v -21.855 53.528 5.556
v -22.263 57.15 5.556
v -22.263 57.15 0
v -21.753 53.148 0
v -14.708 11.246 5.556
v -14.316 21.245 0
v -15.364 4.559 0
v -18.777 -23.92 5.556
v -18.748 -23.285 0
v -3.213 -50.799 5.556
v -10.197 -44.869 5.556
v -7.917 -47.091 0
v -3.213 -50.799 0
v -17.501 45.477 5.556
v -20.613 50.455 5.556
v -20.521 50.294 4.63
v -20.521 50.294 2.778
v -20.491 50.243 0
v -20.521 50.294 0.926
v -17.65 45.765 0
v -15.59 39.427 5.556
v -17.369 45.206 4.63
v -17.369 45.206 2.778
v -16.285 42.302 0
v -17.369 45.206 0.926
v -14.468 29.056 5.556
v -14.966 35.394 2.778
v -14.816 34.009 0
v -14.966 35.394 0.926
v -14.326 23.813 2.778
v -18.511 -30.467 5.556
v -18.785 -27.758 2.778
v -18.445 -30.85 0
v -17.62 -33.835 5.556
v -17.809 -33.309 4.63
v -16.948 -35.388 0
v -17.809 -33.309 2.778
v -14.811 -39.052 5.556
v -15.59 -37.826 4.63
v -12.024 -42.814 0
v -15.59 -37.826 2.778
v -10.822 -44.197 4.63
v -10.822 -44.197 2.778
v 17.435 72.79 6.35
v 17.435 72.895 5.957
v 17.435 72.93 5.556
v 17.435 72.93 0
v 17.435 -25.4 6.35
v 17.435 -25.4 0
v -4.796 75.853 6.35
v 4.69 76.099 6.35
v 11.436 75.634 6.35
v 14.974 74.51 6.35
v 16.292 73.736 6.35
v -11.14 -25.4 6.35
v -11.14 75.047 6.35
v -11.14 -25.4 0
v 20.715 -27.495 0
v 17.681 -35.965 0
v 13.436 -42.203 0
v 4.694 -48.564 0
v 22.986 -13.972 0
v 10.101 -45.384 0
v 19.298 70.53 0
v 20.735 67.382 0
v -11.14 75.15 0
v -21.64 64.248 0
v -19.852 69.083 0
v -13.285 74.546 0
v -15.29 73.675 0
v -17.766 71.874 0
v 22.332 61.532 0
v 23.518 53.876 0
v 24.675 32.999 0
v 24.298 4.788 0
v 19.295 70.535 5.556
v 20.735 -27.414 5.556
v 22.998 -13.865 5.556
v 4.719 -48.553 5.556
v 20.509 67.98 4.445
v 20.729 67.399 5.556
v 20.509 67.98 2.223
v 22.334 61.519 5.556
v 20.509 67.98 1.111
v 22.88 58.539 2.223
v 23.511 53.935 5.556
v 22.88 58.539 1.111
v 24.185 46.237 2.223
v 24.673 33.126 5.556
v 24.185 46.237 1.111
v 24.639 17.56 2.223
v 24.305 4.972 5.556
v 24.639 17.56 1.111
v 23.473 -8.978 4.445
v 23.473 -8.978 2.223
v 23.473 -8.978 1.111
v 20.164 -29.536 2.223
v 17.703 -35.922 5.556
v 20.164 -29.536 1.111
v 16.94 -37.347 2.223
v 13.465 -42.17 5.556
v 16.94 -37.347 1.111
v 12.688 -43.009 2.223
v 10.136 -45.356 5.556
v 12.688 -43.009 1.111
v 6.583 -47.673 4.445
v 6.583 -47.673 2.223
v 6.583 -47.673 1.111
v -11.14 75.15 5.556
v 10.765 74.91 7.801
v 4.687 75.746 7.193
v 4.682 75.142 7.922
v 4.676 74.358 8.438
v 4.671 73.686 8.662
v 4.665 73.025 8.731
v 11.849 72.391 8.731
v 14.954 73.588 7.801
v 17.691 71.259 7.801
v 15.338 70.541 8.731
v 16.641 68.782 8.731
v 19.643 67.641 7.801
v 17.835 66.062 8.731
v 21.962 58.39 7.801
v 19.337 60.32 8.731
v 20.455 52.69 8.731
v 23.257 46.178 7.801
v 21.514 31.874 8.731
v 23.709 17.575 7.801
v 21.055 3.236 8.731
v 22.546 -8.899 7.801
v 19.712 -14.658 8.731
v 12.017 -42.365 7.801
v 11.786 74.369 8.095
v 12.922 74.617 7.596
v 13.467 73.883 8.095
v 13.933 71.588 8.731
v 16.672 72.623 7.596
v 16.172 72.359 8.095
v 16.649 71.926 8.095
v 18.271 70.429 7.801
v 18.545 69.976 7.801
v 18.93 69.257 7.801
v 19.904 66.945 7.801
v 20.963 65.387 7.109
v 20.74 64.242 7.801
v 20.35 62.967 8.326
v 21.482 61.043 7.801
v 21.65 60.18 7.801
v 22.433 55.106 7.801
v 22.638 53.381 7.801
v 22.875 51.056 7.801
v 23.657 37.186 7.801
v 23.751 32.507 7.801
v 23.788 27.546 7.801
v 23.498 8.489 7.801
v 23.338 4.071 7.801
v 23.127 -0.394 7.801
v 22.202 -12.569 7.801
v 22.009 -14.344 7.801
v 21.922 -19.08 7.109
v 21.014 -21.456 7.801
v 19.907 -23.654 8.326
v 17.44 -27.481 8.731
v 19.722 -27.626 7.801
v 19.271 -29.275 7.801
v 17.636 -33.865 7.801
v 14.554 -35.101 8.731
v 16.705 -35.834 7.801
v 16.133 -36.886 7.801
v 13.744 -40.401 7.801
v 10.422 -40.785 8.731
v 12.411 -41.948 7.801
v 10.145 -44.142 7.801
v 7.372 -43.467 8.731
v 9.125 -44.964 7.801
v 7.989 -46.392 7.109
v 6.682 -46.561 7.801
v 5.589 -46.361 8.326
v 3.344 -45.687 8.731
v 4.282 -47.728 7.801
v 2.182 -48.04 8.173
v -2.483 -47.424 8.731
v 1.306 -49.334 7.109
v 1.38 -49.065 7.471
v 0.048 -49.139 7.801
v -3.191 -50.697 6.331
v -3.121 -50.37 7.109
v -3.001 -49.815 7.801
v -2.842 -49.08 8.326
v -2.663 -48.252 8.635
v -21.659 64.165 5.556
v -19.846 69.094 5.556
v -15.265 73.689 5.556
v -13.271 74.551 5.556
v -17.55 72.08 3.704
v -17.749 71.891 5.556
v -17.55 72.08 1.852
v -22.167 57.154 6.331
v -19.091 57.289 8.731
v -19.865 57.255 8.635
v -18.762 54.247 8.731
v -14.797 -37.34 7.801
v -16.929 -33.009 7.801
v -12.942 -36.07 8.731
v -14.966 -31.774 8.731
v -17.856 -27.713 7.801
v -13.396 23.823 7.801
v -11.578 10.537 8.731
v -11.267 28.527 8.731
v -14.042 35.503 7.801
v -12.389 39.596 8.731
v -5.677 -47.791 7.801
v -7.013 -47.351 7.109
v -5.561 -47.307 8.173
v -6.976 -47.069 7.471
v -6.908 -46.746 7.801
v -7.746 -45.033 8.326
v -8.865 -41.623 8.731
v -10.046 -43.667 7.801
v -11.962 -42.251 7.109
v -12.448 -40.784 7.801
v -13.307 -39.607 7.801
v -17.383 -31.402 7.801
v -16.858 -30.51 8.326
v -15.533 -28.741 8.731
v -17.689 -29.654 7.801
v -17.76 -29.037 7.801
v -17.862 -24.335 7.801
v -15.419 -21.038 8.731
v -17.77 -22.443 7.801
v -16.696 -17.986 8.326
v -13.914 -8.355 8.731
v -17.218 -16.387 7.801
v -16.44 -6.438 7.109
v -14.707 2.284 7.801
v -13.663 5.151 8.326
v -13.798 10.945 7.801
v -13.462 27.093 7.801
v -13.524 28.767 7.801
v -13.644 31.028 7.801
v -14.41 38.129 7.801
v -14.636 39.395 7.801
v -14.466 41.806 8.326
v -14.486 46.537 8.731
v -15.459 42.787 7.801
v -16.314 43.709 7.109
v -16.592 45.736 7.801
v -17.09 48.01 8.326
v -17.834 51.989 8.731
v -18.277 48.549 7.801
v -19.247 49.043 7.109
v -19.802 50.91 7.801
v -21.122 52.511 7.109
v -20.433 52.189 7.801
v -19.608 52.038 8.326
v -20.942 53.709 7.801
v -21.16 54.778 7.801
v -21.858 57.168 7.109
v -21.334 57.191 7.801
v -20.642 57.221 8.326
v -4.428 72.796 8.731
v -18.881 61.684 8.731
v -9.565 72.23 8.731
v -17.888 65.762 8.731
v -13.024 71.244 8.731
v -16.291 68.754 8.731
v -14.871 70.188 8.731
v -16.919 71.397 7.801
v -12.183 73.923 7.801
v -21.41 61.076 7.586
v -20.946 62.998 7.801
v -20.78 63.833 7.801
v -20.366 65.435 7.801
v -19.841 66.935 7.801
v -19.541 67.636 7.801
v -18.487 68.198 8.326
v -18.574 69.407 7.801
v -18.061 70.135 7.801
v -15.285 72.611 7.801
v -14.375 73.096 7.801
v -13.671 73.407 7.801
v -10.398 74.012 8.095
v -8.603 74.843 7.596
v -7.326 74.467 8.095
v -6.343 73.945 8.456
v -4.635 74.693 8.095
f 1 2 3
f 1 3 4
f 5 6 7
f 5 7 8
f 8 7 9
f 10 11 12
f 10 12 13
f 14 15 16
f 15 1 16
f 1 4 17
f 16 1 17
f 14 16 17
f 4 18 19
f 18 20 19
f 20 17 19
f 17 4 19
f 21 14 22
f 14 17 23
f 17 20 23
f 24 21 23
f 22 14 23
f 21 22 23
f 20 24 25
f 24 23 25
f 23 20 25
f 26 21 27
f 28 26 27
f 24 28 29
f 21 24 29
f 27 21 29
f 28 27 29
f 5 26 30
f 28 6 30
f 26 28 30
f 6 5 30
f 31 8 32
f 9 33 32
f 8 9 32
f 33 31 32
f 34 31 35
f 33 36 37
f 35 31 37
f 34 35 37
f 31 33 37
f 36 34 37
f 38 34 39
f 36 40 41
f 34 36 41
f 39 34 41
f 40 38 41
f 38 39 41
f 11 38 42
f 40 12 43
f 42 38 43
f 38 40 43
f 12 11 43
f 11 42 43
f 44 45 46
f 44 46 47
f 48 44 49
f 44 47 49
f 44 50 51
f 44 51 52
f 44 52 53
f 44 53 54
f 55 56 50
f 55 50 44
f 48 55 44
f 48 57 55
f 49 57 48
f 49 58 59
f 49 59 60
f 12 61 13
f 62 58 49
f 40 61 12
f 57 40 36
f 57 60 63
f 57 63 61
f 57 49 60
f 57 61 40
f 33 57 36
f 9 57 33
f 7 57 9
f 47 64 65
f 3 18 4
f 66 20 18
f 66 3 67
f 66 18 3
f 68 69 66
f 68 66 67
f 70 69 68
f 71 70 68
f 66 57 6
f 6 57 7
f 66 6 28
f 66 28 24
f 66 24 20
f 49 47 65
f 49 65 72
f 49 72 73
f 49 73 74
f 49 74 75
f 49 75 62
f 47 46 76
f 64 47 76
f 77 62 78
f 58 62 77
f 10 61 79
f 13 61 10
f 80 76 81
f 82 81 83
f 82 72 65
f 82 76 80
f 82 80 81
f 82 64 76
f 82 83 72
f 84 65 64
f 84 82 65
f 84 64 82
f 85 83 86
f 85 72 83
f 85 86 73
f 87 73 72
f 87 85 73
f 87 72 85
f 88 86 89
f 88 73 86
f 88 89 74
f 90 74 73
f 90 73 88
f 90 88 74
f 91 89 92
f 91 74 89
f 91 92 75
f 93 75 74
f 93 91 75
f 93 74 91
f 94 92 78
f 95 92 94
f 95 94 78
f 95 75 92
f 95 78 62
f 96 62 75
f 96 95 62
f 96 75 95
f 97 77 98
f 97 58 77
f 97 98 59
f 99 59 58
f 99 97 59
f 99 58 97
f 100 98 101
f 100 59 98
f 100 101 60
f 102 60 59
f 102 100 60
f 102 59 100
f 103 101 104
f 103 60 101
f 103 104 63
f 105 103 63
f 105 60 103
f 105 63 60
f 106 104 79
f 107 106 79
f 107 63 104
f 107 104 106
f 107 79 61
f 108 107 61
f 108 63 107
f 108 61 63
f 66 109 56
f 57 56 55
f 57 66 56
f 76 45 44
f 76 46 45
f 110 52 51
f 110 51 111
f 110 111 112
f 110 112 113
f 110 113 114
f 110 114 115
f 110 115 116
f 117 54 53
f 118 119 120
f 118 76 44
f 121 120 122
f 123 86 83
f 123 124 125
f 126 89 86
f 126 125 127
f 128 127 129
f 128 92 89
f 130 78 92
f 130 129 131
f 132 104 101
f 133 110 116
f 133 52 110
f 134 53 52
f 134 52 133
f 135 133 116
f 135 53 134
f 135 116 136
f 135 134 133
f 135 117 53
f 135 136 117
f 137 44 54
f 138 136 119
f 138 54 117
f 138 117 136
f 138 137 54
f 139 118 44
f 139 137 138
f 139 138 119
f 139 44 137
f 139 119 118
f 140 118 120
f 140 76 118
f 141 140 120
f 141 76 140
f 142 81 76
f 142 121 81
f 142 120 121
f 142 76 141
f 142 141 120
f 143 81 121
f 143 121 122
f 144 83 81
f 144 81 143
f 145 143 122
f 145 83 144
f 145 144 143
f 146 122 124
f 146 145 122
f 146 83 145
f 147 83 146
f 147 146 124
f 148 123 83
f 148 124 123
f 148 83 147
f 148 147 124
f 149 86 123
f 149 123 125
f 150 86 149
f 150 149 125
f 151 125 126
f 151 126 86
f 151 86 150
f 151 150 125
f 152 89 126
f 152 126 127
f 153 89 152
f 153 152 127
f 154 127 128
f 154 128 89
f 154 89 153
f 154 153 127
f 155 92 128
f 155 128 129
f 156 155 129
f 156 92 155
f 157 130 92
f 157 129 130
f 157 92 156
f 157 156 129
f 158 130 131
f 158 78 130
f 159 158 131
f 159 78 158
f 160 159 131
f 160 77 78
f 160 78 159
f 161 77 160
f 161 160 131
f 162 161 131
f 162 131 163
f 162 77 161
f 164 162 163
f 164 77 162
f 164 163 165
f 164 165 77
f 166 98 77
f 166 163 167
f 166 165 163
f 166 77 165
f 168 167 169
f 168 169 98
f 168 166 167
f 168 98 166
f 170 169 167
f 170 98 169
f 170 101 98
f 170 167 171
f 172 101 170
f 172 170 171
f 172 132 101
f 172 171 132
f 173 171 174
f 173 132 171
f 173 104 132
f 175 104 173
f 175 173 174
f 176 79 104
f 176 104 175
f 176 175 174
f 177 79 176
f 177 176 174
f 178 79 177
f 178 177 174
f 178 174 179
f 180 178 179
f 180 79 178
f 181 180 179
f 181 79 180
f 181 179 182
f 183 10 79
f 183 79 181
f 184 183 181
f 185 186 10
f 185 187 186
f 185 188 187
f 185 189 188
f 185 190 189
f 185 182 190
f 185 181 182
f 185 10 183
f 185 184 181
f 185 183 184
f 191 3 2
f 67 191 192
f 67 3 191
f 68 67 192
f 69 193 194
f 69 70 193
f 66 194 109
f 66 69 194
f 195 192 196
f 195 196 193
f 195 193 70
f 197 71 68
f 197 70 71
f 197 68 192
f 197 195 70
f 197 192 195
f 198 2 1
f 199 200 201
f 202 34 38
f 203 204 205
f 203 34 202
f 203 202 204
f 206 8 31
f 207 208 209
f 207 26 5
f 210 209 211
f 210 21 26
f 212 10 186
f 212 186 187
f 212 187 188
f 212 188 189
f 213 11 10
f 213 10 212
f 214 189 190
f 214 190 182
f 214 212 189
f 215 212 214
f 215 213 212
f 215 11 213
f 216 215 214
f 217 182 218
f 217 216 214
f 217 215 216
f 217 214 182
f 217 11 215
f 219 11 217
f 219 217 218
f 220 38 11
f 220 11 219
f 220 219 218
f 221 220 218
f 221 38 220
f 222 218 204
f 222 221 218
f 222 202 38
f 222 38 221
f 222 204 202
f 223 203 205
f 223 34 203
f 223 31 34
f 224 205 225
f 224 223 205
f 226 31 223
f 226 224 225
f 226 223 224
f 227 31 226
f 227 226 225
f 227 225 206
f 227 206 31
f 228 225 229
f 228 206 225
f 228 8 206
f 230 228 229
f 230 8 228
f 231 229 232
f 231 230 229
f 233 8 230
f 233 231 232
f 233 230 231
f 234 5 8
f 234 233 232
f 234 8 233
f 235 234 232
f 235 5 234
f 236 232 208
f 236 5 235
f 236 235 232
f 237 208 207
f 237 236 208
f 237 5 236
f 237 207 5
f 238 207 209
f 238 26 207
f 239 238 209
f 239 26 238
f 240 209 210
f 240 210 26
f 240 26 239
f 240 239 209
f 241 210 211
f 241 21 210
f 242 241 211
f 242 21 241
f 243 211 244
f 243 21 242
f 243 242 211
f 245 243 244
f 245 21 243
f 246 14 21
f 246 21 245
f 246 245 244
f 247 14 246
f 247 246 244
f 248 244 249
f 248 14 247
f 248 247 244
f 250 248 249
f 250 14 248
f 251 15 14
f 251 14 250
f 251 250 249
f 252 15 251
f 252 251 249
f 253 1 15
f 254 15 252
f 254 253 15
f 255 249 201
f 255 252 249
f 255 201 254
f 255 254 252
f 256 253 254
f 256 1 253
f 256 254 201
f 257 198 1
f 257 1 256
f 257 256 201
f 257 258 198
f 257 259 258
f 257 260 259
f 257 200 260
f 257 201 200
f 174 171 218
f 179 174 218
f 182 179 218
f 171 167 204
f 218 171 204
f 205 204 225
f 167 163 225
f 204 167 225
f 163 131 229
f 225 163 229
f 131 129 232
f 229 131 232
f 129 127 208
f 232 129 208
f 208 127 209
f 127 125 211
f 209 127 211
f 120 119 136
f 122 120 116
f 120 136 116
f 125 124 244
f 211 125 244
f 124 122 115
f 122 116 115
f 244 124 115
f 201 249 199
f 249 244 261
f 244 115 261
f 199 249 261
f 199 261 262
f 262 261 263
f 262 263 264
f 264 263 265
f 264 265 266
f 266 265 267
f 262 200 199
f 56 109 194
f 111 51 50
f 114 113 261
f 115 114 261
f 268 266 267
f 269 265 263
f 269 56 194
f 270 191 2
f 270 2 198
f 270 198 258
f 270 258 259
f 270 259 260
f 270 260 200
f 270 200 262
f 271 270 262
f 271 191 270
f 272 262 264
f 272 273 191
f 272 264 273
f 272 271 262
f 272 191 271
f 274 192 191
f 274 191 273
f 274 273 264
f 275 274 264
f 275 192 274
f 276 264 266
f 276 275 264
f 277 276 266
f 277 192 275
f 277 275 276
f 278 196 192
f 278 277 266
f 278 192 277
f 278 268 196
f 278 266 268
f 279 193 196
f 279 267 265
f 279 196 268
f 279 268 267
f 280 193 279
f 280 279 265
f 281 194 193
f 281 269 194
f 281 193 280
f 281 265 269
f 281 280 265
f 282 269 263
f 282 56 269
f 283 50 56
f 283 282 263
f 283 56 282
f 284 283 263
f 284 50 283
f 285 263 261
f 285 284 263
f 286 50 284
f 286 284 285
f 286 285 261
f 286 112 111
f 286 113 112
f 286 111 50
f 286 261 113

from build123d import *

# Parameters (mm, degrees)
F1_DEPTH = 8.73125
F2_R     = 3.175
F3_W     = 28.575
F3_H     = 127
F4_DEPTH = 6.35


with BuildPart() as f1:
    # F0 (on Top) → F1 (new body)
    with BuildSketch(Plane.XY):
        with BuildLine():
            add(Edge.make_bspline(
                [(-22.2630089622, 57.15), (-22.4771988152, 63.2990440352), (-19.5114240111, 73.9089506041), (-6.4019025255, 76.1693999245), (1.1398358038, 76.1729106307), (4.6904176342, 76.2)],
                knots=[0, 0, 0, 0, 0.3691493182, 0.6877576776, 1, 1, 1, 1], degree=3))
            add(Edge.make_bspline(
                [(-22.2630089622, 57.15), (-22.2630089622, 50.8514460964), (-15.3473480842, 46.9394491864), (-13.8715606343, 22.3627512215), (-15.0570255507, 3.0651518011), (-20.4466410587, -27.8145738651), (-16.0074621044, -38.1660419017), (-9.4359992072, -46.521846205), (-3.2130089622, -50.7988970175)],
                knots=[0, 0, 0, 0, 0.138868117, 0.3185437234, 0.4995856975, 0.7107090098, 0.8363339586, 1, 1, 1, 1], degree=3))
            add(Edge.make_bspline(
                [(4.6904176342, 76.2), (14.5339909941, 76.3216987252), (24.2244258774, 70.1525650219), (25.3902250152, 16.8633127605), (22.7411357456, -28.7061581774), (13.1823598211, -43.9861209726), (5.1097106189, -49.3051670492), (-3.2130089622, -50.7988970175)],
                knots=[0, 0, 0, 0, 0.1602601979, 0.4302268246, 0.6912927459, 0.8402816289, 1, 1, 1, 1], degree=3))
        make_face()
    extrude(amount=F1_DEPTH)

    # F2
    f2_edges = [f1.edges().sort_by_distance(p)[0] for p in [
        (-14.65314, 73.993268, 8.73125),
        (24.530161, 12.135146, 8.73125),
        (-15.806546, 1.03866, 8.73125),
    ]]
    fillet(f2_edges, radius=F2_R)

    # F3 (on face) → F4 (cut)
    with BuildSketch(Plane(origin=(0, 0, 0), x_dir=(1, 0, 0), z_dir=(0, 0, -1))):
        with Locations((3.1477137653, -38.1)):
            Rectangle(F3_W, F3_H)
    extrude(amount=-F4_DEPTH, mode=Mode.SUBTRACT)


solid = f1.part
